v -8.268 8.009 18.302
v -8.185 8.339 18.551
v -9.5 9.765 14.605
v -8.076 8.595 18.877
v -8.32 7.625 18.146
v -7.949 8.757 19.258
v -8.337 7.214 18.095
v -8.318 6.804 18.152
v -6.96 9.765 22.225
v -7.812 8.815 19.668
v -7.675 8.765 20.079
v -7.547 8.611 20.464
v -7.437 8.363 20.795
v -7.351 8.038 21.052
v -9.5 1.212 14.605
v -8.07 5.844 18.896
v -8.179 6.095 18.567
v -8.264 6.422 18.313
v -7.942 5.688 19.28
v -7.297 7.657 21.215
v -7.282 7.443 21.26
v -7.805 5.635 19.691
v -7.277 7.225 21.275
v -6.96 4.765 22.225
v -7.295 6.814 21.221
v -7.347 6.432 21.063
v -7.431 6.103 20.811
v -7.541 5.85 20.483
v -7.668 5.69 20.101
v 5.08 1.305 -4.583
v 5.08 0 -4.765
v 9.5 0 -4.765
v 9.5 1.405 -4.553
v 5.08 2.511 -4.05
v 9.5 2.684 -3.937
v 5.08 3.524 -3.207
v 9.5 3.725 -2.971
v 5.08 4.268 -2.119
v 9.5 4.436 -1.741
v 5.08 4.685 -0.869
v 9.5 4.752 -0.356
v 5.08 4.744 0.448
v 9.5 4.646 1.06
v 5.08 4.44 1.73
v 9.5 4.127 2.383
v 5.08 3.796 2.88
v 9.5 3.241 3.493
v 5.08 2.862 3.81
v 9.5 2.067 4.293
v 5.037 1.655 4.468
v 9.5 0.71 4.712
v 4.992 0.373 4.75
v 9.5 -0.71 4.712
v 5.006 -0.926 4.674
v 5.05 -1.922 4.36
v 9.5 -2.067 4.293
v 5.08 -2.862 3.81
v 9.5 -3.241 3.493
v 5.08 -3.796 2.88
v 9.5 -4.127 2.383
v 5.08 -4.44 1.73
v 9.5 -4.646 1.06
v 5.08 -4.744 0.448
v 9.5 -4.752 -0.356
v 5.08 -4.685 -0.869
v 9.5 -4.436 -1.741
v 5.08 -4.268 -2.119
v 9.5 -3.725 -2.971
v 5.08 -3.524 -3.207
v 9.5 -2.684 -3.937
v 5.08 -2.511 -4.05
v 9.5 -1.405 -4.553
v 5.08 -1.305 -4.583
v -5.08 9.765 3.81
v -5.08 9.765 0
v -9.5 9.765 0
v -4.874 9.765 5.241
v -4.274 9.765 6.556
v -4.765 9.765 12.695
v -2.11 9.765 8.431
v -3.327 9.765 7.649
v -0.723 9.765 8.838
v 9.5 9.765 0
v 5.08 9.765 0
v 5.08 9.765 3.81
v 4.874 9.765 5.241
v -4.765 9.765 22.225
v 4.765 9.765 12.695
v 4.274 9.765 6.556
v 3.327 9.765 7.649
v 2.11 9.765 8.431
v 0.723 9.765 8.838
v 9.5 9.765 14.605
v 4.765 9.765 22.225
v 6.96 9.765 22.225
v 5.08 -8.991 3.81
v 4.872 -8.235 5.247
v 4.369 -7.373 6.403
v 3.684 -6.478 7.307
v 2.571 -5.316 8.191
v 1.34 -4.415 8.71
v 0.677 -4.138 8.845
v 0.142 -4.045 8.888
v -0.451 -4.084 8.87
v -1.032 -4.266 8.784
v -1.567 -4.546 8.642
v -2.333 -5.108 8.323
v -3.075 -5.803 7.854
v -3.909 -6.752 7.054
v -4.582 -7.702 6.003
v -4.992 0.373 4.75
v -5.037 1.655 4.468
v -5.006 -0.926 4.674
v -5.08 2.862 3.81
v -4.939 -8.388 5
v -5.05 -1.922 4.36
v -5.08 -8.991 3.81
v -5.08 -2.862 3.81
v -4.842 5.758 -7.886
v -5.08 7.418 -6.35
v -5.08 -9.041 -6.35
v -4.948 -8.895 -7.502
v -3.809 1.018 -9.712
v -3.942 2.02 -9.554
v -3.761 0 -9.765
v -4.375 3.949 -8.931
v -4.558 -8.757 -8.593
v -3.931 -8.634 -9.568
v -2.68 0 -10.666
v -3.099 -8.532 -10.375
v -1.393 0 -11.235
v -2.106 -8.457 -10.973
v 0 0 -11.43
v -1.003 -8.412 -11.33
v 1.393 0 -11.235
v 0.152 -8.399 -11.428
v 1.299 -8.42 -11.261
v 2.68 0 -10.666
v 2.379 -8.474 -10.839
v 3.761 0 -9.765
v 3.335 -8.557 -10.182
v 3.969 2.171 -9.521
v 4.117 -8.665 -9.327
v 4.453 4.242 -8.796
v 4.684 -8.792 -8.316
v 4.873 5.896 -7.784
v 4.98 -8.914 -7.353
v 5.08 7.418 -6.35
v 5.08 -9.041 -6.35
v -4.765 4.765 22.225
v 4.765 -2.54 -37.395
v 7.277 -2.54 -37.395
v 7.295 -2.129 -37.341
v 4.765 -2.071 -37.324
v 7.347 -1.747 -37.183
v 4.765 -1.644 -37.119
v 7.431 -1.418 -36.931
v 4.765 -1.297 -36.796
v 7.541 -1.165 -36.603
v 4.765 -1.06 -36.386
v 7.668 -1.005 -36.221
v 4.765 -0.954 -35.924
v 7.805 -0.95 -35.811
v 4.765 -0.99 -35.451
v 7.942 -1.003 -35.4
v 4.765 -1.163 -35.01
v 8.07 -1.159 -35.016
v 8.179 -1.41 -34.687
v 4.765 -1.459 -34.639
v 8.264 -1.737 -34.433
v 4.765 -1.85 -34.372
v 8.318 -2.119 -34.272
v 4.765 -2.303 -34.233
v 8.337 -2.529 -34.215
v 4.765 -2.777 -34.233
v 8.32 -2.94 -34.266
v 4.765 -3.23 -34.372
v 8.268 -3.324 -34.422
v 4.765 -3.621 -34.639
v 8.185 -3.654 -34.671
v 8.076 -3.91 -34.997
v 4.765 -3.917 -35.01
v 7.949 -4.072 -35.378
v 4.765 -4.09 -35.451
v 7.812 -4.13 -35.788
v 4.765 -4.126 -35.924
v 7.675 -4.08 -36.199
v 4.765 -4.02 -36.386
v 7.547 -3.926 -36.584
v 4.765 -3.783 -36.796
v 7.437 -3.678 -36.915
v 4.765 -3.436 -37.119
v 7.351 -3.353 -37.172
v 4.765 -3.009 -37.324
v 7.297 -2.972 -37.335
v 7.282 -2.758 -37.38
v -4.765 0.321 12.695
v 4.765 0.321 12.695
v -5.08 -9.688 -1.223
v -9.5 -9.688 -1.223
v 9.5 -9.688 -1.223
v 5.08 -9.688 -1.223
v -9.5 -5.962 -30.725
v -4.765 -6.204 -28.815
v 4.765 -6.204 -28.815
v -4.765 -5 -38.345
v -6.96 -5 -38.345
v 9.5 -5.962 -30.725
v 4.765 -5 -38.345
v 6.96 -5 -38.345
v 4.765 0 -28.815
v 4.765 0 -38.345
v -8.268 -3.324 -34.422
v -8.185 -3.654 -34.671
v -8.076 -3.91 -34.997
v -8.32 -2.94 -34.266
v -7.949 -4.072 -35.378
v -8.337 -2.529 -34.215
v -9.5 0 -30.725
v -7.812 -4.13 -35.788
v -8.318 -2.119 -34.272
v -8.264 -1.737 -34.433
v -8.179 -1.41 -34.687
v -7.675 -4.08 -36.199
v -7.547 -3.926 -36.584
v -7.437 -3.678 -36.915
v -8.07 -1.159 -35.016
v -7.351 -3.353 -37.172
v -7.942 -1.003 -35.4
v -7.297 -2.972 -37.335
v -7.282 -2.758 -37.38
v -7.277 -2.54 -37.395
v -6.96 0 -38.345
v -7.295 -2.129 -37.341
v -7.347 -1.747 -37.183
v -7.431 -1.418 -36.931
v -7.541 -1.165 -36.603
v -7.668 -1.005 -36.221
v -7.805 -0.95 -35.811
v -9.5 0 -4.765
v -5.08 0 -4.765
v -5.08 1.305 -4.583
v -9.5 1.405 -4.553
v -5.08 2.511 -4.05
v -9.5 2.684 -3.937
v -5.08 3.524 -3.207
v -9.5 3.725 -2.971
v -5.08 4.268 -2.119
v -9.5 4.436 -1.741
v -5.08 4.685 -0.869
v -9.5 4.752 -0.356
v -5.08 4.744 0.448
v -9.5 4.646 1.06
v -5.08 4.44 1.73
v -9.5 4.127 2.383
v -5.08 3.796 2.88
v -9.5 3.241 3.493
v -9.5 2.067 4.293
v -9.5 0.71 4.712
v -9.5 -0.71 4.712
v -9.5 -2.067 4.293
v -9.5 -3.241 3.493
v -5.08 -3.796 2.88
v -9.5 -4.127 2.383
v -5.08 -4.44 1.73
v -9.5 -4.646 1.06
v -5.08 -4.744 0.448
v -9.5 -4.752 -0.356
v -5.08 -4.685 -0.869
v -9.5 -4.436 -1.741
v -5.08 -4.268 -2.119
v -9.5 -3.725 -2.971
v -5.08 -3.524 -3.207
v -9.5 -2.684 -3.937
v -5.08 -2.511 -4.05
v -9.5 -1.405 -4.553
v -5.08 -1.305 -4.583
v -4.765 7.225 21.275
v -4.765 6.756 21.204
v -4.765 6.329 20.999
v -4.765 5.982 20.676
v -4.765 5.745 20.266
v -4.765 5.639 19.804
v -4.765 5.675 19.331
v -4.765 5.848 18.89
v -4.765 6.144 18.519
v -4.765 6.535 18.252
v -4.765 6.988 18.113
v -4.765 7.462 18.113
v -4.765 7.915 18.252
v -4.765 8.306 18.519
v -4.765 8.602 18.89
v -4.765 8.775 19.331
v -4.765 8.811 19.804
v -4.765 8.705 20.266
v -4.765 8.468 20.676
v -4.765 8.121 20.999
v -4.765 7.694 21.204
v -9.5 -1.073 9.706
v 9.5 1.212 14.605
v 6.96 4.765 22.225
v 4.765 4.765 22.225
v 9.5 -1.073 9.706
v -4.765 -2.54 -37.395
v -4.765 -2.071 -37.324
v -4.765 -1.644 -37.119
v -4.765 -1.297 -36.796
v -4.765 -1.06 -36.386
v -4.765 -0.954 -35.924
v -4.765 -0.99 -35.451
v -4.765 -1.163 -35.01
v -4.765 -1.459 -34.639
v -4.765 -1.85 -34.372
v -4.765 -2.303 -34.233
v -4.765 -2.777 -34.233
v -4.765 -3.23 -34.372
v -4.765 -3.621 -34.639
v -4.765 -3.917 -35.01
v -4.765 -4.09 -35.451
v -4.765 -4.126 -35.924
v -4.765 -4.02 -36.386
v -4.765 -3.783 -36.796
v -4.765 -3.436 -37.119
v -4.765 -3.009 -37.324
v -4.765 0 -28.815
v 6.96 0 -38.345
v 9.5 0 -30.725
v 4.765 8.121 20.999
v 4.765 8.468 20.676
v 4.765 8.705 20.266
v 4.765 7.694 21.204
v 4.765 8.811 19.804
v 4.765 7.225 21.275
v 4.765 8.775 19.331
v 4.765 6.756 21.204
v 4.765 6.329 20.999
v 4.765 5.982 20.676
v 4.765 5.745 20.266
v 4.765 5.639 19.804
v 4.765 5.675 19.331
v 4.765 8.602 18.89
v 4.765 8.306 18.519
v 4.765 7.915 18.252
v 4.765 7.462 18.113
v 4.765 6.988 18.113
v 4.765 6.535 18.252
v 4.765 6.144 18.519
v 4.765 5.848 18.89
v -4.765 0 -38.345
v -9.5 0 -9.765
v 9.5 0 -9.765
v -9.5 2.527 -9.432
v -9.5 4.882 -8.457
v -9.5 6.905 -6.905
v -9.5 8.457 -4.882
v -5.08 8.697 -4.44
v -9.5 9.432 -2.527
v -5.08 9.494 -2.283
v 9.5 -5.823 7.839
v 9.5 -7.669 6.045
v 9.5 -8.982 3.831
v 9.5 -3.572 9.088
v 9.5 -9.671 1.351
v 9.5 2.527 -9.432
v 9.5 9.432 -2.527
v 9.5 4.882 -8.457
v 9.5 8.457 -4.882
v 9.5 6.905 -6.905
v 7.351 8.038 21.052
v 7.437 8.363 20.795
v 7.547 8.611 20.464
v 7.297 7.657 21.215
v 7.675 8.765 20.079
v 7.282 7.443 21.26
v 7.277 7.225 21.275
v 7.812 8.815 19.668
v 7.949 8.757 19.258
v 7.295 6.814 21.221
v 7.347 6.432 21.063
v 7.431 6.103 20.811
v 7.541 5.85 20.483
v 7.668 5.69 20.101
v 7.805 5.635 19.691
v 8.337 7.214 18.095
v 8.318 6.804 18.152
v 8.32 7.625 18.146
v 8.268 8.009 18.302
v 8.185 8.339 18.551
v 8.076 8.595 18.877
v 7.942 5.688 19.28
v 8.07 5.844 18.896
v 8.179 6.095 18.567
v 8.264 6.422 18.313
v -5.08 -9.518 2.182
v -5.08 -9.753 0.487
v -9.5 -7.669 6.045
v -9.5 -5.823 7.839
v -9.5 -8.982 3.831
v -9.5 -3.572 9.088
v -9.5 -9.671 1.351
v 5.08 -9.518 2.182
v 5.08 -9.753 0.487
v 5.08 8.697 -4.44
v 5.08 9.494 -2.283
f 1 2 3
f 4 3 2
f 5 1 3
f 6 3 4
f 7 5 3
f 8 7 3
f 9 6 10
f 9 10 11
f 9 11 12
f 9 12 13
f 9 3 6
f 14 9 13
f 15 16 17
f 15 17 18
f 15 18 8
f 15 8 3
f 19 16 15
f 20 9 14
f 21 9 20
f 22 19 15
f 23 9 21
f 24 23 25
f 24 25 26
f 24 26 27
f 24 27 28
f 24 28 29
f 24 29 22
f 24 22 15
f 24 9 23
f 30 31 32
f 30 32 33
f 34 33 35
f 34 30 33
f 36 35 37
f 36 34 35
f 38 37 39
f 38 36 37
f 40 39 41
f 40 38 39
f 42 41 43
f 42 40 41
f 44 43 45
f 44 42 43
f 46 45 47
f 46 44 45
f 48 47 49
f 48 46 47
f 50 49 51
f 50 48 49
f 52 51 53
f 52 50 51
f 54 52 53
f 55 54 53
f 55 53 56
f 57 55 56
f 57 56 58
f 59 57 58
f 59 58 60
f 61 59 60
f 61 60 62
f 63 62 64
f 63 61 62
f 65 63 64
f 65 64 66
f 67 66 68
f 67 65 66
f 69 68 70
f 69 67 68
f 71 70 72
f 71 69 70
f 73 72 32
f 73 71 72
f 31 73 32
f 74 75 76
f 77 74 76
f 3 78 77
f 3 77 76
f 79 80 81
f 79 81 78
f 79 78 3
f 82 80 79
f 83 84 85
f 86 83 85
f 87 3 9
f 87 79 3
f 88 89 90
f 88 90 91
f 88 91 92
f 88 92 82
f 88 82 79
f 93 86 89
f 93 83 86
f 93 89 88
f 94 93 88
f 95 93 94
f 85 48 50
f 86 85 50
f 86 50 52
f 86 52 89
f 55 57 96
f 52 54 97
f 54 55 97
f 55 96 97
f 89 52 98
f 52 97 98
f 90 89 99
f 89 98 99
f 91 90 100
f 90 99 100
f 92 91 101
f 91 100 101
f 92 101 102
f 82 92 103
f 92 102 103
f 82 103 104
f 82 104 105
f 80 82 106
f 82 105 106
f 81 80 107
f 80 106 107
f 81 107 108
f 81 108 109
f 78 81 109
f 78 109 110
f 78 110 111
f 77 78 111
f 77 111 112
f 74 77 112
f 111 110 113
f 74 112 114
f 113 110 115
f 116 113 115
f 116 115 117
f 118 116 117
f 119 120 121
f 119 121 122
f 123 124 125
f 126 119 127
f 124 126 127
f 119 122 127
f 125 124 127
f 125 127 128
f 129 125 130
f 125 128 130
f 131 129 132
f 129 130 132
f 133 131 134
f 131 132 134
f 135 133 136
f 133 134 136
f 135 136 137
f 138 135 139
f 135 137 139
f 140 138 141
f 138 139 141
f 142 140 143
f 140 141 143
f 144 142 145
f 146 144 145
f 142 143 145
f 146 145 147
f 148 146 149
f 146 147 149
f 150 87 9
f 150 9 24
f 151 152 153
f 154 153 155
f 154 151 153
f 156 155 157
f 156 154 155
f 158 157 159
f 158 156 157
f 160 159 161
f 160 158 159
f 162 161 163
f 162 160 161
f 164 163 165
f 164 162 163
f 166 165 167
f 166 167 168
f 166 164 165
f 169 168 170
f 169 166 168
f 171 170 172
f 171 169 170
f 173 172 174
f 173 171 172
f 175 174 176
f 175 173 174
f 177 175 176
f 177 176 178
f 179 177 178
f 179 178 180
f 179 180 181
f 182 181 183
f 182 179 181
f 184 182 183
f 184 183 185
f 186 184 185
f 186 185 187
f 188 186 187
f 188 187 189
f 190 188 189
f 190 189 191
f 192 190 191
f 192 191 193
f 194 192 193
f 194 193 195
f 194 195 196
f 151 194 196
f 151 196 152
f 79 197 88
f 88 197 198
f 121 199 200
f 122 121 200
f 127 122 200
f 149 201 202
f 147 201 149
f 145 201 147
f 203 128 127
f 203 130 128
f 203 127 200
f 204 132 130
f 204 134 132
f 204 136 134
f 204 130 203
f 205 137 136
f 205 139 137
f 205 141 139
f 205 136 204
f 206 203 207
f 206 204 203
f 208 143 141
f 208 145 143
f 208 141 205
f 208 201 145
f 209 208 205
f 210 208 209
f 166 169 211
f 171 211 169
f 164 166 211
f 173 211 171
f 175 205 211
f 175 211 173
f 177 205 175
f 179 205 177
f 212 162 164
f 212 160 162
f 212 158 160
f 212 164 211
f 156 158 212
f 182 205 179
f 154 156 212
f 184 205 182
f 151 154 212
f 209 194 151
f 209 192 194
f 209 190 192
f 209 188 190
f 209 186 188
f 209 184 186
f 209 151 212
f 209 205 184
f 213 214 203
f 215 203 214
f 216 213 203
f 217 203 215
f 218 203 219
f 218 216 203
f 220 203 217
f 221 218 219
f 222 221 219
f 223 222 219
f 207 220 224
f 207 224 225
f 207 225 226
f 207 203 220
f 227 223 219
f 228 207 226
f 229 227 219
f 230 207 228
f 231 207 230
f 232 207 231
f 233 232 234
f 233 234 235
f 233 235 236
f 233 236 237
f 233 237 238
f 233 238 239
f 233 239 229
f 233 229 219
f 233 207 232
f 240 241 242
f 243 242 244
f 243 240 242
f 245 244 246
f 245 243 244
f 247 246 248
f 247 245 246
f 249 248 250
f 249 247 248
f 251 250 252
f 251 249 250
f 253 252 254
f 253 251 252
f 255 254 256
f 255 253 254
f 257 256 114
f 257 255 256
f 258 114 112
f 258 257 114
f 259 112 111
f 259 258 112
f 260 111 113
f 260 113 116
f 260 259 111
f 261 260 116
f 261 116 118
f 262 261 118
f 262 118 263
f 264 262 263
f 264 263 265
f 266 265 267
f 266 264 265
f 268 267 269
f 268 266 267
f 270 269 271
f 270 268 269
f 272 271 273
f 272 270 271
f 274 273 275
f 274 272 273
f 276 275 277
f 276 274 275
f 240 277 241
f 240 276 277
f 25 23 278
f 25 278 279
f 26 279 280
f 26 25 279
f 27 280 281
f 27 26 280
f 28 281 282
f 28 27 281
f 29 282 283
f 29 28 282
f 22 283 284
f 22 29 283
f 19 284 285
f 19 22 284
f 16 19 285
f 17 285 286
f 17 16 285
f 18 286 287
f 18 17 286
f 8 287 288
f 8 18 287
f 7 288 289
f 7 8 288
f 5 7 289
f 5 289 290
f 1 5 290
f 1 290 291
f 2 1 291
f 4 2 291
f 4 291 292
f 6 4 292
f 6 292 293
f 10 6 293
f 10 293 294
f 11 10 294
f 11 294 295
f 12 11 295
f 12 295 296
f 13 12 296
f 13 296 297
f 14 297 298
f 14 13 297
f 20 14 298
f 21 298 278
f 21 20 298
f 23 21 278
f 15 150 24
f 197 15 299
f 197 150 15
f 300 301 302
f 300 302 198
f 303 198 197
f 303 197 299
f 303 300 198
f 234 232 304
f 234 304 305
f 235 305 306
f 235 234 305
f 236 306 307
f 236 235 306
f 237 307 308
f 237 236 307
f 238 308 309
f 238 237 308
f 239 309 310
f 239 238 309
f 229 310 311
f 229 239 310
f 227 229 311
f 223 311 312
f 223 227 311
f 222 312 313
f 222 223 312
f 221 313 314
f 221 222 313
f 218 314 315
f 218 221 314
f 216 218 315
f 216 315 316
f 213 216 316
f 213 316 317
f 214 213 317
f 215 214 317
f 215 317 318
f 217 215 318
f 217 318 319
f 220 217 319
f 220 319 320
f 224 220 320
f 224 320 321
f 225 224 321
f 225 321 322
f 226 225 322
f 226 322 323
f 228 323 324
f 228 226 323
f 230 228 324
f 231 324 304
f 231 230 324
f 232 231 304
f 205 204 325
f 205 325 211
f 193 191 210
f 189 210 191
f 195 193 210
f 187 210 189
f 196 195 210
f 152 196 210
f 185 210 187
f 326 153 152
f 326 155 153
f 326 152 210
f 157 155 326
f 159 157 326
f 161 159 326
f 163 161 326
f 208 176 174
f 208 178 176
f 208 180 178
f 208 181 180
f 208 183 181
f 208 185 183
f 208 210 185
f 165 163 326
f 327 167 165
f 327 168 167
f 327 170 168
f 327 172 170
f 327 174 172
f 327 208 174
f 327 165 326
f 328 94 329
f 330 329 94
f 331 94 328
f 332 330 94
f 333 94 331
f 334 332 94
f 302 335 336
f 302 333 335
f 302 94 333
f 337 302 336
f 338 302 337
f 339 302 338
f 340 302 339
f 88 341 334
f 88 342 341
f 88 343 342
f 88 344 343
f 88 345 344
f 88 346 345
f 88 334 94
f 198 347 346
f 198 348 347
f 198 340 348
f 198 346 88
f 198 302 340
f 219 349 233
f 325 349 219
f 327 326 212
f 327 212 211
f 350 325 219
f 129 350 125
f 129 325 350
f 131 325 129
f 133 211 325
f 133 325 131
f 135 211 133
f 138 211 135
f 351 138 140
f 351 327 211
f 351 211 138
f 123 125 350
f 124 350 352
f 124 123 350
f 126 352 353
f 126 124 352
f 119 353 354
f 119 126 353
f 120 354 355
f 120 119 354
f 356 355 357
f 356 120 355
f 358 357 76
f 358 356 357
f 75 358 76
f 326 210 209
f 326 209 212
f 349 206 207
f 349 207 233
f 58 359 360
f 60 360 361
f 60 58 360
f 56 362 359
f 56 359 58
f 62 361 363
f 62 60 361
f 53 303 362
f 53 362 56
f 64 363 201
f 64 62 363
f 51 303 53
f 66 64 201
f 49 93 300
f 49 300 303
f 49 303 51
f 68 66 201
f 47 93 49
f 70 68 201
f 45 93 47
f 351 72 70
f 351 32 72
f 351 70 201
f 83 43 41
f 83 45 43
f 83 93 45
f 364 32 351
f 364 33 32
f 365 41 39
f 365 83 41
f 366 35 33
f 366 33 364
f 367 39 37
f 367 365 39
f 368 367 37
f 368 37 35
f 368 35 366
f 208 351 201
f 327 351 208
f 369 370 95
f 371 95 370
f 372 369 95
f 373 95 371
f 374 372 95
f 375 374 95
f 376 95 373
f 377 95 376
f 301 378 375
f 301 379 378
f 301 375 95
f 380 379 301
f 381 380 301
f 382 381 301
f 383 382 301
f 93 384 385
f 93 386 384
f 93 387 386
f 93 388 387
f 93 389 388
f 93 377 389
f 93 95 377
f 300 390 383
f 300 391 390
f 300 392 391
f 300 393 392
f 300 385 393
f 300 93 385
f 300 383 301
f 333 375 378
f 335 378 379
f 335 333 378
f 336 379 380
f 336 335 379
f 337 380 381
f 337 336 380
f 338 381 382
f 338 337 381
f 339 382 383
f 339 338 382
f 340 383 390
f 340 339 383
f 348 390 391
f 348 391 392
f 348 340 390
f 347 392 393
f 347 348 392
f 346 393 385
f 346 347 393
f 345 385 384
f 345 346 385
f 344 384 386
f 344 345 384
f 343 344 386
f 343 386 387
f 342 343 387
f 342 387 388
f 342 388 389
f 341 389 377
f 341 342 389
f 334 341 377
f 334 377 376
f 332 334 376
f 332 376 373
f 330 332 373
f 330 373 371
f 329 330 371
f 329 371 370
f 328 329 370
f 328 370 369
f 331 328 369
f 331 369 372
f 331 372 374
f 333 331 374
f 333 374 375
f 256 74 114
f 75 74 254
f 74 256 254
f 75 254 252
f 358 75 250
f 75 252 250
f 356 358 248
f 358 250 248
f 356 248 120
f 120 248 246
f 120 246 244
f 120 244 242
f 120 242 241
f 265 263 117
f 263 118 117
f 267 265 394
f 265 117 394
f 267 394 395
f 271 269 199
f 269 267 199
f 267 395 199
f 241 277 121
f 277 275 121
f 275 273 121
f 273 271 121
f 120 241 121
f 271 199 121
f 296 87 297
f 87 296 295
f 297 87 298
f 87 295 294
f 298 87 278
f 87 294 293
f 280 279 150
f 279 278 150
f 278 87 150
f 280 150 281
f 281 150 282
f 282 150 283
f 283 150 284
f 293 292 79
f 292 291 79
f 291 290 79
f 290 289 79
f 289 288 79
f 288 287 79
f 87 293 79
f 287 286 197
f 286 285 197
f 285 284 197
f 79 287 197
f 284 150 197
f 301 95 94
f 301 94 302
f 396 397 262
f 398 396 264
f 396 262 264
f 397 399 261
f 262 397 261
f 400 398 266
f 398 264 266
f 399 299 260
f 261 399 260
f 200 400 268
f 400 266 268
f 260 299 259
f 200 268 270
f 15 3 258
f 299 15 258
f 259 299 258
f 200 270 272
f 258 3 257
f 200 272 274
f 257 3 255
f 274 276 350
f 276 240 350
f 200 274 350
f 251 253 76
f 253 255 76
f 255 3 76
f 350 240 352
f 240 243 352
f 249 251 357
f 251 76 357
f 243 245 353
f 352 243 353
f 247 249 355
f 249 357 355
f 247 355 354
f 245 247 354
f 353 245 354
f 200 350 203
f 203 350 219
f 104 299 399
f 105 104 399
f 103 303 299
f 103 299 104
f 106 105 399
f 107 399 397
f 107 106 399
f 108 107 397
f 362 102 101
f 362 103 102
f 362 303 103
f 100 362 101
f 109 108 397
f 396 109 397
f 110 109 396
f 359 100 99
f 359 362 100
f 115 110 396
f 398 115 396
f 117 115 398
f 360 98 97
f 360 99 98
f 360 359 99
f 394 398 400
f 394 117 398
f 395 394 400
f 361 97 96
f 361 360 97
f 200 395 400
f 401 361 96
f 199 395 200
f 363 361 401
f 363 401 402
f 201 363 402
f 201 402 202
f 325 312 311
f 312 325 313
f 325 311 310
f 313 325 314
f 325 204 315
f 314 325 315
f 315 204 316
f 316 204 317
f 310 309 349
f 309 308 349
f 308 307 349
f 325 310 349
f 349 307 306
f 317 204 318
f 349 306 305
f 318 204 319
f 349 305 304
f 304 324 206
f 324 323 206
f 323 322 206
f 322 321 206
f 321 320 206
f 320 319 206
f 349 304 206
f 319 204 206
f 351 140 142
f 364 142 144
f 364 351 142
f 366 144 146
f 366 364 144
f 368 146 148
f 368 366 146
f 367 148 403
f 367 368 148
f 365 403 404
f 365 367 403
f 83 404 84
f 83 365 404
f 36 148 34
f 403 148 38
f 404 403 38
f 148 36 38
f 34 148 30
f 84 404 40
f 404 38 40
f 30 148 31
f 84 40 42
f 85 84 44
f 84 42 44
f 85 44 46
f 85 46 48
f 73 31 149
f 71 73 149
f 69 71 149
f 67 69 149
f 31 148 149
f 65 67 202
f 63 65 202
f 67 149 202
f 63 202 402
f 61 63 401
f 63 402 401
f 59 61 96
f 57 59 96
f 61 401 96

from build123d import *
from OCP.BRepFilletAPI import BRepFilletAPI_MakeChamfer

# Parameters (mm, degrees)
SKETCH2_R               = 4.765
BOSS_EXTRUDE1_DEPTH     = 9.5
CHAMFER1_SIZE           = 2.54
CHAMFER1_SIZE2          = 7.62
CHAMFER2_SIZE           = 7.62
CHAMFER2_SIZE2          = 2.54
CUT_EXTRUDE1_DEPTH      = 41.693294902
CUT_EXTRUDE1_DEPTH_BACK = 41.693294902
CUT_EXTRUDE2_DEPTH      = 41.69329495
CUT_EXTRUDE2_DEPTH_BACK = 41.69329495
SKETCH4_W               = 9.53
SKETCH4_H               = 9.53
CUT_EXTRUDE3_DEPTH      = 41.69329495
CUT_EXTRUDE3_DEPTH_BACK = 41.69329495
SKETCH5_R               = 1.59


with BuildPart() as part:
    # Sketch2 → Boss-Extrude1 (new, symmetric)
    with BuildSketch(Plane(origin=(0, 0, 0), x_dir=(0, 0, -1), z_dir=(1, 0, 0))):
        with BuildLine():
            Line((0, 9.765), (-22.225, 9.765))
            Line((-22.225, 9.765), (-22.225, 4.765))
            Line((-22.225, 4.765), (-9.705896356, -1.072753903))
            ThreePointArc((-9.705896356, -1.072753903), (-6.045130296, -7.668873758), (1.223496761, -9.688048342))
            Line((1.223496761, -9.688048342), (38.345, -5))
            Line((38.345, -5), (38.345, 0))
            Line((38.345, 0), (9.765, 0))
            ThreePointArc((9.765, 0), (6.904897718, 6.904897718), (0, 9.765))
        make_face()
        Circle(SKETCH2_R, mode=Mode.SUBTRACT)
    extrude(amount=BOSS_EXTRUDE1_DEPTH, both=True)

    # Chamfer1: one chamfer whose edges measure the first distance from different faces: ONE call of the kernel's chamfer builder (chamfer() names one face for all edges)
    chamfer1_edges_1 = [part.edges().sort_by_distance(p)[0] for p in [
        (9.5, 7.265, 22.225),
    ]]
    chamfer1_side_1 = [part.faces().sort_by_distance(p)[0] for p in [
        (0, 7.265, 22.225),
    ]]
    chamfer1_edges_2 = [part.edges().sort_by_distance(p)[0] for p in [
        (9.5, -2.5, -38.345),
    ]]
    chamfer1_side_2 = [part.faces().sort_by_distance(p)[0] for p in [
        (0, -2.5, -38.345),
    ]]
    chamfer1 = BRepFilletAPI_MakeChamfer(part.part.solid().wrapped)
    for e in chamfer1_edges_1:
        chamfer1.Add(CHAMFER1_SIZE, CHAMFER1_SIZE2, e.wrapped, chamfer1_side_1[0].wrapped)  # the first distance lies on this face
    for e in chamfer1_edges_2:
        chamfer1.Add(CHAMFER1_SIZE, CHAMFER1_SIZE2, e.wrapped, chamfer1_side_2[0].wrapped)  # the first distance lies on this face
    add(Compound.cast(chamfer1.Shape()), mode=Mode.REPLACE)

    # Chamfer2
    chamfer2_edges = [part.edges().sort_by_distance(p)[0] for p in [
        (-9.5, -2.5, -38.345),
        (-9.5, 7.265, 22.225),
    ]]
    chamfer2_side = [part.faces().sort_by_distance(p)[0] for p in [
        (-9.5, -0.130280991, -5.201405079),
    ]]
    chamfer(chamfer2_edges, length=CHAMFER2_SIZE, length2=CHAMFER2_SIZE2, reference=chamfer2_side[0])

    # Sketch3 → Cut-Extrude1 (cut, two sides: drawn at the far end of the back side and taken through both)
    with BuildSketch(Plane(origin=(0, 0, 0), x_dir=(1, 0, 0), z_dir=(0, 1, 0)).offset(-CUT_EXTRUDE1_DEPTH_BACK)):
        with BuildLine():
            Line((-5.08, -3.81), (-5.08, 6.35))
            ThreePointArc((-5.08, 6.35), (0, 11.43), (5.08, 6.35))
            Line((5.08, 6.35), (5.08, -3.81))
            ThreePointArc((5.08, -3.81), (0, -8.89), (-5.08, -3.81))
        make_face()
    extrude(amount=CUT_EXTRUDE1_DEPTH + CUT_EXTRUDE1_DEPTH_BACK, mode=Mode.SUBTRACT)

    # Sketch4 → Cut-Extrude2 (cut, two sides: drawn at the far end of the back side and taken through both)
    with BuildSketch(Plane(origin=(0, 0, 0), x_dir=(1, 0, 0), z_dir=(0, 1, 0)).offset(-CUT_EXTRUDE2_DEPTH_BACK)):
        with Locations((0, 33.58)):
            Rectangle(SKETCH4_W, SKETCH4_H)
        with Locations((0, -17.46)):
            Rectangle(SKETCH4_W, SKETCH4_H)
    extrude(amount=CUT_EXTRUDE2_DEPTH + CUT_EXTRUDE2_DEPTH_BACK, mode=Mode.SUBTRACT)

    # Sketch5 → Cut-Extrude3 (cut, two sides: drawn at the far end of the back side and taken through both)
    with BuildSketch(Plane(origin=(0, 0, 0), x_dir=(0, 0, -1), z_dir=(1, 0, 0)).offset(-CUT_EXTRUDE3_DEPTH_BACK)):
        with Locations((35.805, -2.54)):
            Circle(SKETCH5_R)
        with Locations(Location((-19.685, 7.225, 0), (0, 0, 180))):
            Circle(SKETCH5_R)
    extrude(amount=CUT_EXTRUDE3_DEPTH + CUT_EXTRUDE3_DEPTH_BACK, mode=Mode.SUBTRACT)


solid = part.part
